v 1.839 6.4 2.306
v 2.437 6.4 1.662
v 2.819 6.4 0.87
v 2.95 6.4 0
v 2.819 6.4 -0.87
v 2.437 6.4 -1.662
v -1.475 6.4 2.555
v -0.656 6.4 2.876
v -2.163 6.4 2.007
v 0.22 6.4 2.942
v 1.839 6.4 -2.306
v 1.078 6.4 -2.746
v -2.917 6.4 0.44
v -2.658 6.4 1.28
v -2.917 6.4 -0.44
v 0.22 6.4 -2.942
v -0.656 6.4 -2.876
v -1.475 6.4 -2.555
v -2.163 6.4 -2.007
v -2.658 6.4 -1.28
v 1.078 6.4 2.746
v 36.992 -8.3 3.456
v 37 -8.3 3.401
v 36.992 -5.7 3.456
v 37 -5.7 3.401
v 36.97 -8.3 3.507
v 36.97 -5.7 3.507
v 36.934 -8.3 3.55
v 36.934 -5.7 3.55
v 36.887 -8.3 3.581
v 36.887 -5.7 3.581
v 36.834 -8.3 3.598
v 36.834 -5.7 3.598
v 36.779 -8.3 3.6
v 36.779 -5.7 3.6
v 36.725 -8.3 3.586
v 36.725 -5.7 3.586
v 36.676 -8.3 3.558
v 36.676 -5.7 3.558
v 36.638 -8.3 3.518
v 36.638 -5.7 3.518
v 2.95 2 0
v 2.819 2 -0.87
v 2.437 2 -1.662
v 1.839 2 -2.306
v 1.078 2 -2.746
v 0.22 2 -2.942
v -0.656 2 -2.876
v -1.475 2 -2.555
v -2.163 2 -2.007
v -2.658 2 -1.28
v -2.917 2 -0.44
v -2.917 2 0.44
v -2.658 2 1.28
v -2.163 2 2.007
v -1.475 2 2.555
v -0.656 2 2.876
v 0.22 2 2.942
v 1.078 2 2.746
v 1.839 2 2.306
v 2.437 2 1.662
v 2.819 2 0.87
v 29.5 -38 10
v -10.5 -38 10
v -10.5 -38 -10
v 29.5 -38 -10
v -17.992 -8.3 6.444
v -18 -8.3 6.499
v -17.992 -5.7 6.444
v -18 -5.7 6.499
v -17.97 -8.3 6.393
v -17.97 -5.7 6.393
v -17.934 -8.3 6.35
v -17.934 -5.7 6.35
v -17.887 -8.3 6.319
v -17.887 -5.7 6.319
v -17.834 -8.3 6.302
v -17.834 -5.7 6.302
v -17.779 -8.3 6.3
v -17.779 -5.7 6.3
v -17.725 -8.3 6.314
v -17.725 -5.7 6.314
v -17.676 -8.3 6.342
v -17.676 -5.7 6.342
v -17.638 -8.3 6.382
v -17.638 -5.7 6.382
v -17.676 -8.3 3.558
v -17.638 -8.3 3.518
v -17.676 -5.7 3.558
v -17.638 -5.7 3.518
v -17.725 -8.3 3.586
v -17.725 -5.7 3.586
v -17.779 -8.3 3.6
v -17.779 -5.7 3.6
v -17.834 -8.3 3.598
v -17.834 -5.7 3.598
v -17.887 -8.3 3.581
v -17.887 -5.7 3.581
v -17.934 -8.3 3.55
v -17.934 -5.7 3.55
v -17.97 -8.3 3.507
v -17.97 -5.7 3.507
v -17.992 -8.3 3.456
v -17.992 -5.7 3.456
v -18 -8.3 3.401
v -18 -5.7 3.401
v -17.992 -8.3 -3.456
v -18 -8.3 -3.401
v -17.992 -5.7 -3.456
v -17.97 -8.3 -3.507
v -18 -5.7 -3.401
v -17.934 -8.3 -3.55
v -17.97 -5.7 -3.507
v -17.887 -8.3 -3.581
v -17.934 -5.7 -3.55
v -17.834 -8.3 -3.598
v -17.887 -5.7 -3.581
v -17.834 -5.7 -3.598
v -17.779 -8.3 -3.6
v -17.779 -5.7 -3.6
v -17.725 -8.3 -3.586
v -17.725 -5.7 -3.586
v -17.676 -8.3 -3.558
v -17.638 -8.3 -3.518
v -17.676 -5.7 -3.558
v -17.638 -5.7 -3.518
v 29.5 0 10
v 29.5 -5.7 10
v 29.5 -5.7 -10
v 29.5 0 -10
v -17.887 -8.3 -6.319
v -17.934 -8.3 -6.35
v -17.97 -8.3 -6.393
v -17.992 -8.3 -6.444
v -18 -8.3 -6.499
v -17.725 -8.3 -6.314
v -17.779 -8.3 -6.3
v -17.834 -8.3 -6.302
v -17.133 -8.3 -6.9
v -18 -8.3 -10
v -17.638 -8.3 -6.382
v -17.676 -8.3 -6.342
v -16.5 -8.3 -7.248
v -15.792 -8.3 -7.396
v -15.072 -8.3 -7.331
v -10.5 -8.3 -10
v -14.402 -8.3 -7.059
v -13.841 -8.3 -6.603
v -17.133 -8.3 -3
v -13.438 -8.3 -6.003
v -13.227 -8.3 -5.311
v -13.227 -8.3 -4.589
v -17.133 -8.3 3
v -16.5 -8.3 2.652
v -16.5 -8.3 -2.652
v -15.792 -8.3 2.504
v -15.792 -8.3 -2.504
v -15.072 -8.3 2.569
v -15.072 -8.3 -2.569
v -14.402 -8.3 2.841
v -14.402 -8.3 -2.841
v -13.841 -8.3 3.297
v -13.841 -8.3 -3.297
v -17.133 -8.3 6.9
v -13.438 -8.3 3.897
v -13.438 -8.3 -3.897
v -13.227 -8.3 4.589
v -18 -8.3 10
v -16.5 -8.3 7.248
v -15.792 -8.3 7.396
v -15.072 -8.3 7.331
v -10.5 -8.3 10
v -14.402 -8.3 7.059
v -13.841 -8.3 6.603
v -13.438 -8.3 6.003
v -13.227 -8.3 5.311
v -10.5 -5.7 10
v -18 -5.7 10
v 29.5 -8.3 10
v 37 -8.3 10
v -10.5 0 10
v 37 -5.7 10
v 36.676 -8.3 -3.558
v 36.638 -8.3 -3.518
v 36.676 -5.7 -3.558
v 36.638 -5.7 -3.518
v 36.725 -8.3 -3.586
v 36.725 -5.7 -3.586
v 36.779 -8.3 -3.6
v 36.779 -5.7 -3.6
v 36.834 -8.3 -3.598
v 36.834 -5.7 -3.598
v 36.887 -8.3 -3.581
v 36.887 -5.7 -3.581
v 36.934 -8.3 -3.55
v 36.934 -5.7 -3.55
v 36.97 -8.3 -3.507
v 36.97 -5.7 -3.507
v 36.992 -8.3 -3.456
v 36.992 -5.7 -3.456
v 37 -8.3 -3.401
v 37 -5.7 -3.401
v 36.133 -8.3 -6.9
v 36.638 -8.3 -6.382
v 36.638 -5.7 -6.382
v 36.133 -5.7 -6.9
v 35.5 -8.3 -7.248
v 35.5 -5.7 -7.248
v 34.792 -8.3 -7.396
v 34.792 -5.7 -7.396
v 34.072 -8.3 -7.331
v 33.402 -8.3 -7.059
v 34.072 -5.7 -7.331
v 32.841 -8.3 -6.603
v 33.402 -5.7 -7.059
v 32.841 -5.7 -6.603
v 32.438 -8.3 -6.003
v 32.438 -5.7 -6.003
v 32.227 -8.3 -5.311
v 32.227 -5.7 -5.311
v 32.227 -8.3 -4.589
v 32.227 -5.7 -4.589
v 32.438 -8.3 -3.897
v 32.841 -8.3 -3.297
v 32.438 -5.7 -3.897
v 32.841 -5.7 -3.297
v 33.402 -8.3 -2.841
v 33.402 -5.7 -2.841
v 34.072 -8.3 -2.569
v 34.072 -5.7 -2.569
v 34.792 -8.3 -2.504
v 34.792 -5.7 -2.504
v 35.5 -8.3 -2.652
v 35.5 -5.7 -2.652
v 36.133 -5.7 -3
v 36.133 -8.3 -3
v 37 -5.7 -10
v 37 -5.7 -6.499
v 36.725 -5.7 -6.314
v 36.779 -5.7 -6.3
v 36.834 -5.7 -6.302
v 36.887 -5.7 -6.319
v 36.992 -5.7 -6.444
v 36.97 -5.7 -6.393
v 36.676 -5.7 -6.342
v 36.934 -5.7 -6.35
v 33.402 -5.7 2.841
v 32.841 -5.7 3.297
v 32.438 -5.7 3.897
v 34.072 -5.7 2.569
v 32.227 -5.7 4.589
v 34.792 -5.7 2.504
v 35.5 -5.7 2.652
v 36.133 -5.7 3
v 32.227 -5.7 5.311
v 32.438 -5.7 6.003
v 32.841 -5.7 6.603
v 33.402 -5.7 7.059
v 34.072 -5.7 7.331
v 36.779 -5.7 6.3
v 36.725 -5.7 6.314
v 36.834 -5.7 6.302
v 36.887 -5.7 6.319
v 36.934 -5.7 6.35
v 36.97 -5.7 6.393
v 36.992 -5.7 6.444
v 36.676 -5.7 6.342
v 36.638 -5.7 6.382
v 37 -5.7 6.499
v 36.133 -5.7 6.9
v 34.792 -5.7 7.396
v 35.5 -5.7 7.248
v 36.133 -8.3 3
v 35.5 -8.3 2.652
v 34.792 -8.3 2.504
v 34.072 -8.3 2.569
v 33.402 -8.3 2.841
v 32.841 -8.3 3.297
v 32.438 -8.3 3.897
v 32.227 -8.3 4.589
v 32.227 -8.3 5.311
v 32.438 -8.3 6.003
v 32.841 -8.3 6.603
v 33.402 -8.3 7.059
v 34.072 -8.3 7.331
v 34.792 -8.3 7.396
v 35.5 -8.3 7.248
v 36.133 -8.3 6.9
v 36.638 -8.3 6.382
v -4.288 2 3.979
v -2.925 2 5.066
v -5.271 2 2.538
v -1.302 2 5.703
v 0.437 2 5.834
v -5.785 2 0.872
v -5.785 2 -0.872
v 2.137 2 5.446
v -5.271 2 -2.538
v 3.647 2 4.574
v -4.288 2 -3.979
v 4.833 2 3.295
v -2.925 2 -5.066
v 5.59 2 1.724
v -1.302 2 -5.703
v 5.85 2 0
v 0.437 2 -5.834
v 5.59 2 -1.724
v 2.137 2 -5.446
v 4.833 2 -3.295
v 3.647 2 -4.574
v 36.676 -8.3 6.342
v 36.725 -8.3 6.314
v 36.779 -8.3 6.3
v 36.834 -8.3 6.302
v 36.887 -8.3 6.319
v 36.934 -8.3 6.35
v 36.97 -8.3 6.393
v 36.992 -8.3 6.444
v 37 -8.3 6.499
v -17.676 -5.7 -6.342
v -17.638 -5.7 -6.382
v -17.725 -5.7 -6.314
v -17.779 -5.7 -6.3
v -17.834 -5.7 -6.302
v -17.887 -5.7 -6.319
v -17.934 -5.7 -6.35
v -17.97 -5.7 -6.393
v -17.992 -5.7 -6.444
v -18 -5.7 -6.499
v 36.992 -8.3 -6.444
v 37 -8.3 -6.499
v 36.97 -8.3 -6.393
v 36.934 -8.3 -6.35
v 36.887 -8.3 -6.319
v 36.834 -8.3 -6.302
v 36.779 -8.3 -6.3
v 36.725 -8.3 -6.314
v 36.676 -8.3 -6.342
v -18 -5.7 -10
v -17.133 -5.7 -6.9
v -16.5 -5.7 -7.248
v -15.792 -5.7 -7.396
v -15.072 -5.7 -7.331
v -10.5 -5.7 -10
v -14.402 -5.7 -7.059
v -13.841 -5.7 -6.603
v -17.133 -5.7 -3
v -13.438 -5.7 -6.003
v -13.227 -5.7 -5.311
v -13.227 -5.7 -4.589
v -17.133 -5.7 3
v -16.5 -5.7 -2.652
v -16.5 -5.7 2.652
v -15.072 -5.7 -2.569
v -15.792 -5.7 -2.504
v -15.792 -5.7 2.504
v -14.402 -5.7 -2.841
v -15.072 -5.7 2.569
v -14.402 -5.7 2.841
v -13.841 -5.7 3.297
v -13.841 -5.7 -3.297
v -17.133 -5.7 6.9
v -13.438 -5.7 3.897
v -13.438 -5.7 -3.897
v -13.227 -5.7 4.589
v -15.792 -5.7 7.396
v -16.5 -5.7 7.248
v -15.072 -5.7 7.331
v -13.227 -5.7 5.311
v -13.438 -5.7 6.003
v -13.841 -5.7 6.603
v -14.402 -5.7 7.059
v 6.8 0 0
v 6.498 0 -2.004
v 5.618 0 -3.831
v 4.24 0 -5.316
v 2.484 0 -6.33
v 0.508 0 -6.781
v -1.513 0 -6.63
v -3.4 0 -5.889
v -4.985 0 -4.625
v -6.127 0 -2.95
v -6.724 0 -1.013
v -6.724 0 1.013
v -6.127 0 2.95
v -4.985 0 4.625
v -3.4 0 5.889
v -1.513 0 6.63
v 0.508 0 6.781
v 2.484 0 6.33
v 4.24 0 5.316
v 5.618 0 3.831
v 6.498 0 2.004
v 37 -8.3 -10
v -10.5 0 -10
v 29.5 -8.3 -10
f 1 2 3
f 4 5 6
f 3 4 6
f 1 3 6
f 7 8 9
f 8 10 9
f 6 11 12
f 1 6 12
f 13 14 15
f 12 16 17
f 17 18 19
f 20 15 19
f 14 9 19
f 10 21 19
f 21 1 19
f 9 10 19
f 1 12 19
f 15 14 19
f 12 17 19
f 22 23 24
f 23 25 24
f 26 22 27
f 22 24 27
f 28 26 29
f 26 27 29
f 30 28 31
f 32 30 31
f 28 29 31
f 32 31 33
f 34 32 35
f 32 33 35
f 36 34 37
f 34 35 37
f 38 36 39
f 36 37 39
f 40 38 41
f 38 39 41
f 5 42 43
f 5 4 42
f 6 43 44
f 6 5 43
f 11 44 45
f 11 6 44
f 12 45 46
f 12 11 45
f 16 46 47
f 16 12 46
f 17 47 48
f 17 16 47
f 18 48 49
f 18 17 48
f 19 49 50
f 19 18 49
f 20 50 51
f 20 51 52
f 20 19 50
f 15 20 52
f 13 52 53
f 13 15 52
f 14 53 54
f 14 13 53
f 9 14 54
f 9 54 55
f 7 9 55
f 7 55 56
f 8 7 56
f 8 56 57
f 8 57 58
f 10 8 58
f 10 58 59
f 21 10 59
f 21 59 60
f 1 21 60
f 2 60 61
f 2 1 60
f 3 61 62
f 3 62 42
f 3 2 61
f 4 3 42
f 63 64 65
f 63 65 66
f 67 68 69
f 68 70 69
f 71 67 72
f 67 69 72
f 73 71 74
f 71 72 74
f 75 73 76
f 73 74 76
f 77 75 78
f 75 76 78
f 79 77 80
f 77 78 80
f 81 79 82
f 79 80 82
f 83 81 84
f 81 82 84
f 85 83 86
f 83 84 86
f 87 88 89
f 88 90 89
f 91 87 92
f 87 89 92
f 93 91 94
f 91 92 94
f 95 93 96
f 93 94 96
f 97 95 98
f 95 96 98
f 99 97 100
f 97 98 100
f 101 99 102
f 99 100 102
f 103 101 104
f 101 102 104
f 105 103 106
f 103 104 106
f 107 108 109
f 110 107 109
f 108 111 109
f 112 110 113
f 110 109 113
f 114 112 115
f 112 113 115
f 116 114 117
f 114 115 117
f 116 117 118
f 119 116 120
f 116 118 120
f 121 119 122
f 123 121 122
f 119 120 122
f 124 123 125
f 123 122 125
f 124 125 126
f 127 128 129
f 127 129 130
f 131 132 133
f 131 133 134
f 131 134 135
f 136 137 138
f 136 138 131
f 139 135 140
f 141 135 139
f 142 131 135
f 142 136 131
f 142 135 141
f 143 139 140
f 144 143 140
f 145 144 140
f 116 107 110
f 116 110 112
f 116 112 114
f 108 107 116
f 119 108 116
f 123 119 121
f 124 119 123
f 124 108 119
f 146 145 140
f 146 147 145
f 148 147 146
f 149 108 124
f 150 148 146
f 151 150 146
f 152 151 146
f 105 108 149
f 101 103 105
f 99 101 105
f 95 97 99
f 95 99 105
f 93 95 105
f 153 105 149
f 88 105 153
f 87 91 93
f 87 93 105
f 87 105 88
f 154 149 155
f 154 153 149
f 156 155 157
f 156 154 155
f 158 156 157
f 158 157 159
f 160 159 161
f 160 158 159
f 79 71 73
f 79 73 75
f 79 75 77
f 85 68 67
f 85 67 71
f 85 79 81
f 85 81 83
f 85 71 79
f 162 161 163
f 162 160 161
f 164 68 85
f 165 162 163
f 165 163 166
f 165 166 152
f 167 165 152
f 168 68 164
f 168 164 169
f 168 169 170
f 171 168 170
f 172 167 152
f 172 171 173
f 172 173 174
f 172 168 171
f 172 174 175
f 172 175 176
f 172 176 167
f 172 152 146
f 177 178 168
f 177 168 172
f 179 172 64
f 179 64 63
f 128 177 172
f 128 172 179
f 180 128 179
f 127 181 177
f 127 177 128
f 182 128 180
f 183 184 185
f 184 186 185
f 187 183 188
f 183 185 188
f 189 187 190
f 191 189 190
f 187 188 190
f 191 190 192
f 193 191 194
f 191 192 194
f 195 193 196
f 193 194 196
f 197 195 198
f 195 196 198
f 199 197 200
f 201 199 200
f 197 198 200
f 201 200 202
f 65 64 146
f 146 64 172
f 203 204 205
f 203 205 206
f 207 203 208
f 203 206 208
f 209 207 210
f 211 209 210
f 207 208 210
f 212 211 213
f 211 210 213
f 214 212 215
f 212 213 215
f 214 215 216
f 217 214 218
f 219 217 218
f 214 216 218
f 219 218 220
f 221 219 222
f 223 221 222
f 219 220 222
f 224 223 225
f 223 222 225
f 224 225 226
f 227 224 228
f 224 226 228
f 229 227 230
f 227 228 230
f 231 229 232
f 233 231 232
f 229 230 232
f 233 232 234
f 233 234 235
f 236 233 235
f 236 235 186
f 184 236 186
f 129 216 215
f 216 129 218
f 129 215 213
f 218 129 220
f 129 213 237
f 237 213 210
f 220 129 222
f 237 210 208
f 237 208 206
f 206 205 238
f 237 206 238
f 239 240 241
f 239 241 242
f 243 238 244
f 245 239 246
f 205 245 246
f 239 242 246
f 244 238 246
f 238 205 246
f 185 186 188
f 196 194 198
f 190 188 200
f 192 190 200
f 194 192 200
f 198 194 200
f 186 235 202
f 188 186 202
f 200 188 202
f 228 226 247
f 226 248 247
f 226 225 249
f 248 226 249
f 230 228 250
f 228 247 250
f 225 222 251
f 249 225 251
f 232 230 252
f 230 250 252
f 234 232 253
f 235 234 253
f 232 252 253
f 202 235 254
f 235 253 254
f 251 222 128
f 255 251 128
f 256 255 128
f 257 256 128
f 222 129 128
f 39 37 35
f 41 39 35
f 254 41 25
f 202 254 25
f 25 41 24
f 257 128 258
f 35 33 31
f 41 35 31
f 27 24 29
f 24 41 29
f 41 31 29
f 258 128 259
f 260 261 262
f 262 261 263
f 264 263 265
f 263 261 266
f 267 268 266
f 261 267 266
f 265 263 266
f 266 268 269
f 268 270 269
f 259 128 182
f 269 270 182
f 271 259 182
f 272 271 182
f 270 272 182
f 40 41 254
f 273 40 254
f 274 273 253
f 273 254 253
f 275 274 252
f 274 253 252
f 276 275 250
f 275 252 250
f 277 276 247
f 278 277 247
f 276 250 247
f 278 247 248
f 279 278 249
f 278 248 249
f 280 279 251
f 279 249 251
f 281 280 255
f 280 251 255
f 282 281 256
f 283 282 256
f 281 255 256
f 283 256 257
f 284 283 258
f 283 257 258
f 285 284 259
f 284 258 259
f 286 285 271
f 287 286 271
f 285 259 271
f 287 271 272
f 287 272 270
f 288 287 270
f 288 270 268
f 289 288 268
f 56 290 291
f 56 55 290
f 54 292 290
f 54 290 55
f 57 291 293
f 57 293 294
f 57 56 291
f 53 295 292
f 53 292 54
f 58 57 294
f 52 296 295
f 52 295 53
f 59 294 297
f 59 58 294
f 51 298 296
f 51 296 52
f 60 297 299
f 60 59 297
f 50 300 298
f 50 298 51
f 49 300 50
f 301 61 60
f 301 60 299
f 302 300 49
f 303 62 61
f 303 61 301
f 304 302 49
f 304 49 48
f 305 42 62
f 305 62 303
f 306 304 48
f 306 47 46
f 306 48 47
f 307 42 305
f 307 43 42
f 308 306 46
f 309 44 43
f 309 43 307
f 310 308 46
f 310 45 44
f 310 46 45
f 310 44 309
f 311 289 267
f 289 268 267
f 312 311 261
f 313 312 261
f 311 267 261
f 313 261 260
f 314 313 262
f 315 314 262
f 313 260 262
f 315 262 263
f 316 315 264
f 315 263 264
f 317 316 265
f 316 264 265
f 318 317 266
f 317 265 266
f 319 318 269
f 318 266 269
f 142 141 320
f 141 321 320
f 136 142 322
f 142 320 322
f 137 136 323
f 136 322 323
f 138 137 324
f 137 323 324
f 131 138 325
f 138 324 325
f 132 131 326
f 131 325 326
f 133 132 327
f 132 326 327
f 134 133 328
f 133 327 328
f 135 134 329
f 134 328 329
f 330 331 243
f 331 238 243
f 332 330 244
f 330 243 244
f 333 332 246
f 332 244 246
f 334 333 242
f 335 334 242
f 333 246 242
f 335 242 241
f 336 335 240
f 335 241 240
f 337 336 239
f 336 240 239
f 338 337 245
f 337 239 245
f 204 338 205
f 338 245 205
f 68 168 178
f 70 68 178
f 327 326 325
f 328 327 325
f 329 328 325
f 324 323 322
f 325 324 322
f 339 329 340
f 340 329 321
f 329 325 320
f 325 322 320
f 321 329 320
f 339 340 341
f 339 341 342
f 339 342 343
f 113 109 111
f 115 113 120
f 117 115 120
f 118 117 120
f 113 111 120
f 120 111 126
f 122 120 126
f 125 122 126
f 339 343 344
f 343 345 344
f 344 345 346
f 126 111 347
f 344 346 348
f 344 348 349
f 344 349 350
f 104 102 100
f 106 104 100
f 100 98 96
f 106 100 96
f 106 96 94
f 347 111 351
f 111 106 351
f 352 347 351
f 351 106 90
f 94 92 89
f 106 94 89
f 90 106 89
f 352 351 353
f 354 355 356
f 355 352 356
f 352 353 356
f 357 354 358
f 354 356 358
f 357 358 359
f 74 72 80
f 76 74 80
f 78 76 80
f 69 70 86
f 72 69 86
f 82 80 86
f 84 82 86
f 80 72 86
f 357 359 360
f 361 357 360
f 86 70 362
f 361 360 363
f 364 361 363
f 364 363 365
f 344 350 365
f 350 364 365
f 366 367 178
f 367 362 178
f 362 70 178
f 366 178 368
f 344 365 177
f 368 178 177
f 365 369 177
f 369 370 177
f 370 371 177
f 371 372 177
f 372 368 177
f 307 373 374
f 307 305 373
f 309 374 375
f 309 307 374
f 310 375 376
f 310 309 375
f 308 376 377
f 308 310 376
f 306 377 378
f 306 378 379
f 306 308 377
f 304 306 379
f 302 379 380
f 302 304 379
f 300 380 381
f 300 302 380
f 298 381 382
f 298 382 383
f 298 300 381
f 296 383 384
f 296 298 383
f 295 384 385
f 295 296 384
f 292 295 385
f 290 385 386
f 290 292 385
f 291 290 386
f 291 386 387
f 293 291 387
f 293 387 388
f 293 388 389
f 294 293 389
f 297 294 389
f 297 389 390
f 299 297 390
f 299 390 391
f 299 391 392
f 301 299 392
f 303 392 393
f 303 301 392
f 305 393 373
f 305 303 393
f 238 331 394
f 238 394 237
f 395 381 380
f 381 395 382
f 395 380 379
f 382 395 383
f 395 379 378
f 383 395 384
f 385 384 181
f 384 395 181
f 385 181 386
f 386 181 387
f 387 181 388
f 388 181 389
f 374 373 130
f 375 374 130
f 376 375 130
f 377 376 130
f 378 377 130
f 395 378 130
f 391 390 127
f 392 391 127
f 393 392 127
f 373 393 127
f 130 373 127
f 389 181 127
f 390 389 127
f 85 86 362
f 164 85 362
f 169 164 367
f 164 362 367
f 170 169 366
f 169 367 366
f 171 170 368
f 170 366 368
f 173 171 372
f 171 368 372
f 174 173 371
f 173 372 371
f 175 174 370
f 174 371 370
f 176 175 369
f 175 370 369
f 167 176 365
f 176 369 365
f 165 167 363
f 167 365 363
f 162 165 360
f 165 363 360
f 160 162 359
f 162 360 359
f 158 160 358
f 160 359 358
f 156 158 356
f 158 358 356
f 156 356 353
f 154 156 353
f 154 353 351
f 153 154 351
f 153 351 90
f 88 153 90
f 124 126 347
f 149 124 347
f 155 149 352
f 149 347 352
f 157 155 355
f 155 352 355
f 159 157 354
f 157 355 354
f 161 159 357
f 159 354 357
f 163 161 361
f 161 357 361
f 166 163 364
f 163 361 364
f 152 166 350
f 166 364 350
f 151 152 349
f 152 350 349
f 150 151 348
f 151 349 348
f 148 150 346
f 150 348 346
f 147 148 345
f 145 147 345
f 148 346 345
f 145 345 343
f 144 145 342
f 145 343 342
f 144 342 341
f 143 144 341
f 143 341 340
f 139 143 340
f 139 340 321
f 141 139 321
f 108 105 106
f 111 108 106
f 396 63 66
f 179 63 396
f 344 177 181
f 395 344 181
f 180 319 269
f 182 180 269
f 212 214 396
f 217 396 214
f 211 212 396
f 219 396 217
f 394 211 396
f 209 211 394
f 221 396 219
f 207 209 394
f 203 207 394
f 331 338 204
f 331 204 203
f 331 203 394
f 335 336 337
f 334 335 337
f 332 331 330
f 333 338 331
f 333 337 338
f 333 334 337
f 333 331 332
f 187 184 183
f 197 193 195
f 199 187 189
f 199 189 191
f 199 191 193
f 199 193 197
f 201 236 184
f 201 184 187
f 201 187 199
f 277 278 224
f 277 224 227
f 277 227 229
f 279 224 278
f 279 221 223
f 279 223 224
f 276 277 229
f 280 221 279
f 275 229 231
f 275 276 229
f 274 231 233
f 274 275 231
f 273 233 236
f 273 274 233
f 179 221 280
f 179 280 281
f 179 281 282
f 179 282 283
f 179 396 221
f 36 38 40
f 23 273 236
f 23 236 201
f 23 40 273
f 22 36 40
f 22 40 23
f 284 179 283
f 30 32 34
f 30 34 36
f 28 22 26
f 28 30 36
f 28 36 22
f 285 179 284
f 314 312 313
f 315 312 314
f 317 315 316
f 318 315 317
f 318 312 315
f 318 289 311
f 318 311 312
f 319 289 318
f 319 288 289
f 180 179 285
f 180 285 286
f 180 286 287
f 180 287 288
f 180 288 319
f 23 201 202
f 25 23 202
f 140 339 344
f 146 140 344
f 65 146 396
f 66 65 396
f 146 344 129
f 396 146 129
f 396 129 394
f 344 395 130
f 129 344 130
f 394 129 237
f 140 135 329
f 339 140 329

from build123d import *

# Parameters (mm, degrees)
RESSALTO_EXTRUS_O1_DEPTH = 10
ESBO_O3_R                = 2.45
CORTE_EXTRUS_O1_DEPTH    = 51.122749326
FILETE1_R                = 0.2


with BuildPart() as part:
    # Esboço1 → Ressalto-extrusão1 (new, symmetric)
    with BuildSketch(Plane.XY):
        Polygon((-10.5, 0), (-10.5, -5.7), (-18, -5.7), (-18, -8.3), (-10.5, -8.3), (-10.5, -38), (29.5, -38), (29.5, -8.3), (37, -8.3), (37, -5.7), (29.5, -5.7), (29.5, 0), align=None)
    extrude(amount=RESSALTO_EXTRUS_O1_DEPTH, both=True)

    # Esboço1<3> → Revolução1 (revolve)
    with BuildSketch(Plane.XY):
        Polygon((0, 0), (6.8, 0), (5.85, 2), (2.95, 2), (2.95, 6.4), (0, 6.4), align=None)
    revolve(axis=Axis((0, 0, 0), (0, 1, 0)))

    # Esboço3 → Corte-extrusão1 (cut, through all)
    with BuildSketch(Plane(origin=(0, -5.7, 0), x_dir=(1, 0, 0), z_dir=(0, 1, 0))):
        with Locations((-15.65, 4.95)):
            Circle(ESBO_O3_R)
        with Locations((-15.65, -4.95)):
            Circle(ESBO_O3_R)
        with Locations((34.65, -4.95)):
            Circle(ESBO_O3_R)
        with Locations((34.65, 4.95)):
            Circle(ESBO_O3_R)
    extrude(amount=-CORTE_EXTRUS_O1_DEPTH, mode=Mode.SUBTRACT)

    # Filete1
    filete1_edges = [part.edges().sort_by_distance(p)[0] for p in [
        (37, -7, 5.642820323),
        (37, -7, -4.257179677),
        (37, -7, 4.257179677),
        (37, -7, -5.642820323),
        (-18, -7, 4.257179677),
        (-18, -7, 5.642820323),
        (-18, -7, -4.257179677),
        (-18, -7, -5.642820323),
    ]]
    fillet(filete1_edges, radius=FILETE1_R)


solid = part.part
